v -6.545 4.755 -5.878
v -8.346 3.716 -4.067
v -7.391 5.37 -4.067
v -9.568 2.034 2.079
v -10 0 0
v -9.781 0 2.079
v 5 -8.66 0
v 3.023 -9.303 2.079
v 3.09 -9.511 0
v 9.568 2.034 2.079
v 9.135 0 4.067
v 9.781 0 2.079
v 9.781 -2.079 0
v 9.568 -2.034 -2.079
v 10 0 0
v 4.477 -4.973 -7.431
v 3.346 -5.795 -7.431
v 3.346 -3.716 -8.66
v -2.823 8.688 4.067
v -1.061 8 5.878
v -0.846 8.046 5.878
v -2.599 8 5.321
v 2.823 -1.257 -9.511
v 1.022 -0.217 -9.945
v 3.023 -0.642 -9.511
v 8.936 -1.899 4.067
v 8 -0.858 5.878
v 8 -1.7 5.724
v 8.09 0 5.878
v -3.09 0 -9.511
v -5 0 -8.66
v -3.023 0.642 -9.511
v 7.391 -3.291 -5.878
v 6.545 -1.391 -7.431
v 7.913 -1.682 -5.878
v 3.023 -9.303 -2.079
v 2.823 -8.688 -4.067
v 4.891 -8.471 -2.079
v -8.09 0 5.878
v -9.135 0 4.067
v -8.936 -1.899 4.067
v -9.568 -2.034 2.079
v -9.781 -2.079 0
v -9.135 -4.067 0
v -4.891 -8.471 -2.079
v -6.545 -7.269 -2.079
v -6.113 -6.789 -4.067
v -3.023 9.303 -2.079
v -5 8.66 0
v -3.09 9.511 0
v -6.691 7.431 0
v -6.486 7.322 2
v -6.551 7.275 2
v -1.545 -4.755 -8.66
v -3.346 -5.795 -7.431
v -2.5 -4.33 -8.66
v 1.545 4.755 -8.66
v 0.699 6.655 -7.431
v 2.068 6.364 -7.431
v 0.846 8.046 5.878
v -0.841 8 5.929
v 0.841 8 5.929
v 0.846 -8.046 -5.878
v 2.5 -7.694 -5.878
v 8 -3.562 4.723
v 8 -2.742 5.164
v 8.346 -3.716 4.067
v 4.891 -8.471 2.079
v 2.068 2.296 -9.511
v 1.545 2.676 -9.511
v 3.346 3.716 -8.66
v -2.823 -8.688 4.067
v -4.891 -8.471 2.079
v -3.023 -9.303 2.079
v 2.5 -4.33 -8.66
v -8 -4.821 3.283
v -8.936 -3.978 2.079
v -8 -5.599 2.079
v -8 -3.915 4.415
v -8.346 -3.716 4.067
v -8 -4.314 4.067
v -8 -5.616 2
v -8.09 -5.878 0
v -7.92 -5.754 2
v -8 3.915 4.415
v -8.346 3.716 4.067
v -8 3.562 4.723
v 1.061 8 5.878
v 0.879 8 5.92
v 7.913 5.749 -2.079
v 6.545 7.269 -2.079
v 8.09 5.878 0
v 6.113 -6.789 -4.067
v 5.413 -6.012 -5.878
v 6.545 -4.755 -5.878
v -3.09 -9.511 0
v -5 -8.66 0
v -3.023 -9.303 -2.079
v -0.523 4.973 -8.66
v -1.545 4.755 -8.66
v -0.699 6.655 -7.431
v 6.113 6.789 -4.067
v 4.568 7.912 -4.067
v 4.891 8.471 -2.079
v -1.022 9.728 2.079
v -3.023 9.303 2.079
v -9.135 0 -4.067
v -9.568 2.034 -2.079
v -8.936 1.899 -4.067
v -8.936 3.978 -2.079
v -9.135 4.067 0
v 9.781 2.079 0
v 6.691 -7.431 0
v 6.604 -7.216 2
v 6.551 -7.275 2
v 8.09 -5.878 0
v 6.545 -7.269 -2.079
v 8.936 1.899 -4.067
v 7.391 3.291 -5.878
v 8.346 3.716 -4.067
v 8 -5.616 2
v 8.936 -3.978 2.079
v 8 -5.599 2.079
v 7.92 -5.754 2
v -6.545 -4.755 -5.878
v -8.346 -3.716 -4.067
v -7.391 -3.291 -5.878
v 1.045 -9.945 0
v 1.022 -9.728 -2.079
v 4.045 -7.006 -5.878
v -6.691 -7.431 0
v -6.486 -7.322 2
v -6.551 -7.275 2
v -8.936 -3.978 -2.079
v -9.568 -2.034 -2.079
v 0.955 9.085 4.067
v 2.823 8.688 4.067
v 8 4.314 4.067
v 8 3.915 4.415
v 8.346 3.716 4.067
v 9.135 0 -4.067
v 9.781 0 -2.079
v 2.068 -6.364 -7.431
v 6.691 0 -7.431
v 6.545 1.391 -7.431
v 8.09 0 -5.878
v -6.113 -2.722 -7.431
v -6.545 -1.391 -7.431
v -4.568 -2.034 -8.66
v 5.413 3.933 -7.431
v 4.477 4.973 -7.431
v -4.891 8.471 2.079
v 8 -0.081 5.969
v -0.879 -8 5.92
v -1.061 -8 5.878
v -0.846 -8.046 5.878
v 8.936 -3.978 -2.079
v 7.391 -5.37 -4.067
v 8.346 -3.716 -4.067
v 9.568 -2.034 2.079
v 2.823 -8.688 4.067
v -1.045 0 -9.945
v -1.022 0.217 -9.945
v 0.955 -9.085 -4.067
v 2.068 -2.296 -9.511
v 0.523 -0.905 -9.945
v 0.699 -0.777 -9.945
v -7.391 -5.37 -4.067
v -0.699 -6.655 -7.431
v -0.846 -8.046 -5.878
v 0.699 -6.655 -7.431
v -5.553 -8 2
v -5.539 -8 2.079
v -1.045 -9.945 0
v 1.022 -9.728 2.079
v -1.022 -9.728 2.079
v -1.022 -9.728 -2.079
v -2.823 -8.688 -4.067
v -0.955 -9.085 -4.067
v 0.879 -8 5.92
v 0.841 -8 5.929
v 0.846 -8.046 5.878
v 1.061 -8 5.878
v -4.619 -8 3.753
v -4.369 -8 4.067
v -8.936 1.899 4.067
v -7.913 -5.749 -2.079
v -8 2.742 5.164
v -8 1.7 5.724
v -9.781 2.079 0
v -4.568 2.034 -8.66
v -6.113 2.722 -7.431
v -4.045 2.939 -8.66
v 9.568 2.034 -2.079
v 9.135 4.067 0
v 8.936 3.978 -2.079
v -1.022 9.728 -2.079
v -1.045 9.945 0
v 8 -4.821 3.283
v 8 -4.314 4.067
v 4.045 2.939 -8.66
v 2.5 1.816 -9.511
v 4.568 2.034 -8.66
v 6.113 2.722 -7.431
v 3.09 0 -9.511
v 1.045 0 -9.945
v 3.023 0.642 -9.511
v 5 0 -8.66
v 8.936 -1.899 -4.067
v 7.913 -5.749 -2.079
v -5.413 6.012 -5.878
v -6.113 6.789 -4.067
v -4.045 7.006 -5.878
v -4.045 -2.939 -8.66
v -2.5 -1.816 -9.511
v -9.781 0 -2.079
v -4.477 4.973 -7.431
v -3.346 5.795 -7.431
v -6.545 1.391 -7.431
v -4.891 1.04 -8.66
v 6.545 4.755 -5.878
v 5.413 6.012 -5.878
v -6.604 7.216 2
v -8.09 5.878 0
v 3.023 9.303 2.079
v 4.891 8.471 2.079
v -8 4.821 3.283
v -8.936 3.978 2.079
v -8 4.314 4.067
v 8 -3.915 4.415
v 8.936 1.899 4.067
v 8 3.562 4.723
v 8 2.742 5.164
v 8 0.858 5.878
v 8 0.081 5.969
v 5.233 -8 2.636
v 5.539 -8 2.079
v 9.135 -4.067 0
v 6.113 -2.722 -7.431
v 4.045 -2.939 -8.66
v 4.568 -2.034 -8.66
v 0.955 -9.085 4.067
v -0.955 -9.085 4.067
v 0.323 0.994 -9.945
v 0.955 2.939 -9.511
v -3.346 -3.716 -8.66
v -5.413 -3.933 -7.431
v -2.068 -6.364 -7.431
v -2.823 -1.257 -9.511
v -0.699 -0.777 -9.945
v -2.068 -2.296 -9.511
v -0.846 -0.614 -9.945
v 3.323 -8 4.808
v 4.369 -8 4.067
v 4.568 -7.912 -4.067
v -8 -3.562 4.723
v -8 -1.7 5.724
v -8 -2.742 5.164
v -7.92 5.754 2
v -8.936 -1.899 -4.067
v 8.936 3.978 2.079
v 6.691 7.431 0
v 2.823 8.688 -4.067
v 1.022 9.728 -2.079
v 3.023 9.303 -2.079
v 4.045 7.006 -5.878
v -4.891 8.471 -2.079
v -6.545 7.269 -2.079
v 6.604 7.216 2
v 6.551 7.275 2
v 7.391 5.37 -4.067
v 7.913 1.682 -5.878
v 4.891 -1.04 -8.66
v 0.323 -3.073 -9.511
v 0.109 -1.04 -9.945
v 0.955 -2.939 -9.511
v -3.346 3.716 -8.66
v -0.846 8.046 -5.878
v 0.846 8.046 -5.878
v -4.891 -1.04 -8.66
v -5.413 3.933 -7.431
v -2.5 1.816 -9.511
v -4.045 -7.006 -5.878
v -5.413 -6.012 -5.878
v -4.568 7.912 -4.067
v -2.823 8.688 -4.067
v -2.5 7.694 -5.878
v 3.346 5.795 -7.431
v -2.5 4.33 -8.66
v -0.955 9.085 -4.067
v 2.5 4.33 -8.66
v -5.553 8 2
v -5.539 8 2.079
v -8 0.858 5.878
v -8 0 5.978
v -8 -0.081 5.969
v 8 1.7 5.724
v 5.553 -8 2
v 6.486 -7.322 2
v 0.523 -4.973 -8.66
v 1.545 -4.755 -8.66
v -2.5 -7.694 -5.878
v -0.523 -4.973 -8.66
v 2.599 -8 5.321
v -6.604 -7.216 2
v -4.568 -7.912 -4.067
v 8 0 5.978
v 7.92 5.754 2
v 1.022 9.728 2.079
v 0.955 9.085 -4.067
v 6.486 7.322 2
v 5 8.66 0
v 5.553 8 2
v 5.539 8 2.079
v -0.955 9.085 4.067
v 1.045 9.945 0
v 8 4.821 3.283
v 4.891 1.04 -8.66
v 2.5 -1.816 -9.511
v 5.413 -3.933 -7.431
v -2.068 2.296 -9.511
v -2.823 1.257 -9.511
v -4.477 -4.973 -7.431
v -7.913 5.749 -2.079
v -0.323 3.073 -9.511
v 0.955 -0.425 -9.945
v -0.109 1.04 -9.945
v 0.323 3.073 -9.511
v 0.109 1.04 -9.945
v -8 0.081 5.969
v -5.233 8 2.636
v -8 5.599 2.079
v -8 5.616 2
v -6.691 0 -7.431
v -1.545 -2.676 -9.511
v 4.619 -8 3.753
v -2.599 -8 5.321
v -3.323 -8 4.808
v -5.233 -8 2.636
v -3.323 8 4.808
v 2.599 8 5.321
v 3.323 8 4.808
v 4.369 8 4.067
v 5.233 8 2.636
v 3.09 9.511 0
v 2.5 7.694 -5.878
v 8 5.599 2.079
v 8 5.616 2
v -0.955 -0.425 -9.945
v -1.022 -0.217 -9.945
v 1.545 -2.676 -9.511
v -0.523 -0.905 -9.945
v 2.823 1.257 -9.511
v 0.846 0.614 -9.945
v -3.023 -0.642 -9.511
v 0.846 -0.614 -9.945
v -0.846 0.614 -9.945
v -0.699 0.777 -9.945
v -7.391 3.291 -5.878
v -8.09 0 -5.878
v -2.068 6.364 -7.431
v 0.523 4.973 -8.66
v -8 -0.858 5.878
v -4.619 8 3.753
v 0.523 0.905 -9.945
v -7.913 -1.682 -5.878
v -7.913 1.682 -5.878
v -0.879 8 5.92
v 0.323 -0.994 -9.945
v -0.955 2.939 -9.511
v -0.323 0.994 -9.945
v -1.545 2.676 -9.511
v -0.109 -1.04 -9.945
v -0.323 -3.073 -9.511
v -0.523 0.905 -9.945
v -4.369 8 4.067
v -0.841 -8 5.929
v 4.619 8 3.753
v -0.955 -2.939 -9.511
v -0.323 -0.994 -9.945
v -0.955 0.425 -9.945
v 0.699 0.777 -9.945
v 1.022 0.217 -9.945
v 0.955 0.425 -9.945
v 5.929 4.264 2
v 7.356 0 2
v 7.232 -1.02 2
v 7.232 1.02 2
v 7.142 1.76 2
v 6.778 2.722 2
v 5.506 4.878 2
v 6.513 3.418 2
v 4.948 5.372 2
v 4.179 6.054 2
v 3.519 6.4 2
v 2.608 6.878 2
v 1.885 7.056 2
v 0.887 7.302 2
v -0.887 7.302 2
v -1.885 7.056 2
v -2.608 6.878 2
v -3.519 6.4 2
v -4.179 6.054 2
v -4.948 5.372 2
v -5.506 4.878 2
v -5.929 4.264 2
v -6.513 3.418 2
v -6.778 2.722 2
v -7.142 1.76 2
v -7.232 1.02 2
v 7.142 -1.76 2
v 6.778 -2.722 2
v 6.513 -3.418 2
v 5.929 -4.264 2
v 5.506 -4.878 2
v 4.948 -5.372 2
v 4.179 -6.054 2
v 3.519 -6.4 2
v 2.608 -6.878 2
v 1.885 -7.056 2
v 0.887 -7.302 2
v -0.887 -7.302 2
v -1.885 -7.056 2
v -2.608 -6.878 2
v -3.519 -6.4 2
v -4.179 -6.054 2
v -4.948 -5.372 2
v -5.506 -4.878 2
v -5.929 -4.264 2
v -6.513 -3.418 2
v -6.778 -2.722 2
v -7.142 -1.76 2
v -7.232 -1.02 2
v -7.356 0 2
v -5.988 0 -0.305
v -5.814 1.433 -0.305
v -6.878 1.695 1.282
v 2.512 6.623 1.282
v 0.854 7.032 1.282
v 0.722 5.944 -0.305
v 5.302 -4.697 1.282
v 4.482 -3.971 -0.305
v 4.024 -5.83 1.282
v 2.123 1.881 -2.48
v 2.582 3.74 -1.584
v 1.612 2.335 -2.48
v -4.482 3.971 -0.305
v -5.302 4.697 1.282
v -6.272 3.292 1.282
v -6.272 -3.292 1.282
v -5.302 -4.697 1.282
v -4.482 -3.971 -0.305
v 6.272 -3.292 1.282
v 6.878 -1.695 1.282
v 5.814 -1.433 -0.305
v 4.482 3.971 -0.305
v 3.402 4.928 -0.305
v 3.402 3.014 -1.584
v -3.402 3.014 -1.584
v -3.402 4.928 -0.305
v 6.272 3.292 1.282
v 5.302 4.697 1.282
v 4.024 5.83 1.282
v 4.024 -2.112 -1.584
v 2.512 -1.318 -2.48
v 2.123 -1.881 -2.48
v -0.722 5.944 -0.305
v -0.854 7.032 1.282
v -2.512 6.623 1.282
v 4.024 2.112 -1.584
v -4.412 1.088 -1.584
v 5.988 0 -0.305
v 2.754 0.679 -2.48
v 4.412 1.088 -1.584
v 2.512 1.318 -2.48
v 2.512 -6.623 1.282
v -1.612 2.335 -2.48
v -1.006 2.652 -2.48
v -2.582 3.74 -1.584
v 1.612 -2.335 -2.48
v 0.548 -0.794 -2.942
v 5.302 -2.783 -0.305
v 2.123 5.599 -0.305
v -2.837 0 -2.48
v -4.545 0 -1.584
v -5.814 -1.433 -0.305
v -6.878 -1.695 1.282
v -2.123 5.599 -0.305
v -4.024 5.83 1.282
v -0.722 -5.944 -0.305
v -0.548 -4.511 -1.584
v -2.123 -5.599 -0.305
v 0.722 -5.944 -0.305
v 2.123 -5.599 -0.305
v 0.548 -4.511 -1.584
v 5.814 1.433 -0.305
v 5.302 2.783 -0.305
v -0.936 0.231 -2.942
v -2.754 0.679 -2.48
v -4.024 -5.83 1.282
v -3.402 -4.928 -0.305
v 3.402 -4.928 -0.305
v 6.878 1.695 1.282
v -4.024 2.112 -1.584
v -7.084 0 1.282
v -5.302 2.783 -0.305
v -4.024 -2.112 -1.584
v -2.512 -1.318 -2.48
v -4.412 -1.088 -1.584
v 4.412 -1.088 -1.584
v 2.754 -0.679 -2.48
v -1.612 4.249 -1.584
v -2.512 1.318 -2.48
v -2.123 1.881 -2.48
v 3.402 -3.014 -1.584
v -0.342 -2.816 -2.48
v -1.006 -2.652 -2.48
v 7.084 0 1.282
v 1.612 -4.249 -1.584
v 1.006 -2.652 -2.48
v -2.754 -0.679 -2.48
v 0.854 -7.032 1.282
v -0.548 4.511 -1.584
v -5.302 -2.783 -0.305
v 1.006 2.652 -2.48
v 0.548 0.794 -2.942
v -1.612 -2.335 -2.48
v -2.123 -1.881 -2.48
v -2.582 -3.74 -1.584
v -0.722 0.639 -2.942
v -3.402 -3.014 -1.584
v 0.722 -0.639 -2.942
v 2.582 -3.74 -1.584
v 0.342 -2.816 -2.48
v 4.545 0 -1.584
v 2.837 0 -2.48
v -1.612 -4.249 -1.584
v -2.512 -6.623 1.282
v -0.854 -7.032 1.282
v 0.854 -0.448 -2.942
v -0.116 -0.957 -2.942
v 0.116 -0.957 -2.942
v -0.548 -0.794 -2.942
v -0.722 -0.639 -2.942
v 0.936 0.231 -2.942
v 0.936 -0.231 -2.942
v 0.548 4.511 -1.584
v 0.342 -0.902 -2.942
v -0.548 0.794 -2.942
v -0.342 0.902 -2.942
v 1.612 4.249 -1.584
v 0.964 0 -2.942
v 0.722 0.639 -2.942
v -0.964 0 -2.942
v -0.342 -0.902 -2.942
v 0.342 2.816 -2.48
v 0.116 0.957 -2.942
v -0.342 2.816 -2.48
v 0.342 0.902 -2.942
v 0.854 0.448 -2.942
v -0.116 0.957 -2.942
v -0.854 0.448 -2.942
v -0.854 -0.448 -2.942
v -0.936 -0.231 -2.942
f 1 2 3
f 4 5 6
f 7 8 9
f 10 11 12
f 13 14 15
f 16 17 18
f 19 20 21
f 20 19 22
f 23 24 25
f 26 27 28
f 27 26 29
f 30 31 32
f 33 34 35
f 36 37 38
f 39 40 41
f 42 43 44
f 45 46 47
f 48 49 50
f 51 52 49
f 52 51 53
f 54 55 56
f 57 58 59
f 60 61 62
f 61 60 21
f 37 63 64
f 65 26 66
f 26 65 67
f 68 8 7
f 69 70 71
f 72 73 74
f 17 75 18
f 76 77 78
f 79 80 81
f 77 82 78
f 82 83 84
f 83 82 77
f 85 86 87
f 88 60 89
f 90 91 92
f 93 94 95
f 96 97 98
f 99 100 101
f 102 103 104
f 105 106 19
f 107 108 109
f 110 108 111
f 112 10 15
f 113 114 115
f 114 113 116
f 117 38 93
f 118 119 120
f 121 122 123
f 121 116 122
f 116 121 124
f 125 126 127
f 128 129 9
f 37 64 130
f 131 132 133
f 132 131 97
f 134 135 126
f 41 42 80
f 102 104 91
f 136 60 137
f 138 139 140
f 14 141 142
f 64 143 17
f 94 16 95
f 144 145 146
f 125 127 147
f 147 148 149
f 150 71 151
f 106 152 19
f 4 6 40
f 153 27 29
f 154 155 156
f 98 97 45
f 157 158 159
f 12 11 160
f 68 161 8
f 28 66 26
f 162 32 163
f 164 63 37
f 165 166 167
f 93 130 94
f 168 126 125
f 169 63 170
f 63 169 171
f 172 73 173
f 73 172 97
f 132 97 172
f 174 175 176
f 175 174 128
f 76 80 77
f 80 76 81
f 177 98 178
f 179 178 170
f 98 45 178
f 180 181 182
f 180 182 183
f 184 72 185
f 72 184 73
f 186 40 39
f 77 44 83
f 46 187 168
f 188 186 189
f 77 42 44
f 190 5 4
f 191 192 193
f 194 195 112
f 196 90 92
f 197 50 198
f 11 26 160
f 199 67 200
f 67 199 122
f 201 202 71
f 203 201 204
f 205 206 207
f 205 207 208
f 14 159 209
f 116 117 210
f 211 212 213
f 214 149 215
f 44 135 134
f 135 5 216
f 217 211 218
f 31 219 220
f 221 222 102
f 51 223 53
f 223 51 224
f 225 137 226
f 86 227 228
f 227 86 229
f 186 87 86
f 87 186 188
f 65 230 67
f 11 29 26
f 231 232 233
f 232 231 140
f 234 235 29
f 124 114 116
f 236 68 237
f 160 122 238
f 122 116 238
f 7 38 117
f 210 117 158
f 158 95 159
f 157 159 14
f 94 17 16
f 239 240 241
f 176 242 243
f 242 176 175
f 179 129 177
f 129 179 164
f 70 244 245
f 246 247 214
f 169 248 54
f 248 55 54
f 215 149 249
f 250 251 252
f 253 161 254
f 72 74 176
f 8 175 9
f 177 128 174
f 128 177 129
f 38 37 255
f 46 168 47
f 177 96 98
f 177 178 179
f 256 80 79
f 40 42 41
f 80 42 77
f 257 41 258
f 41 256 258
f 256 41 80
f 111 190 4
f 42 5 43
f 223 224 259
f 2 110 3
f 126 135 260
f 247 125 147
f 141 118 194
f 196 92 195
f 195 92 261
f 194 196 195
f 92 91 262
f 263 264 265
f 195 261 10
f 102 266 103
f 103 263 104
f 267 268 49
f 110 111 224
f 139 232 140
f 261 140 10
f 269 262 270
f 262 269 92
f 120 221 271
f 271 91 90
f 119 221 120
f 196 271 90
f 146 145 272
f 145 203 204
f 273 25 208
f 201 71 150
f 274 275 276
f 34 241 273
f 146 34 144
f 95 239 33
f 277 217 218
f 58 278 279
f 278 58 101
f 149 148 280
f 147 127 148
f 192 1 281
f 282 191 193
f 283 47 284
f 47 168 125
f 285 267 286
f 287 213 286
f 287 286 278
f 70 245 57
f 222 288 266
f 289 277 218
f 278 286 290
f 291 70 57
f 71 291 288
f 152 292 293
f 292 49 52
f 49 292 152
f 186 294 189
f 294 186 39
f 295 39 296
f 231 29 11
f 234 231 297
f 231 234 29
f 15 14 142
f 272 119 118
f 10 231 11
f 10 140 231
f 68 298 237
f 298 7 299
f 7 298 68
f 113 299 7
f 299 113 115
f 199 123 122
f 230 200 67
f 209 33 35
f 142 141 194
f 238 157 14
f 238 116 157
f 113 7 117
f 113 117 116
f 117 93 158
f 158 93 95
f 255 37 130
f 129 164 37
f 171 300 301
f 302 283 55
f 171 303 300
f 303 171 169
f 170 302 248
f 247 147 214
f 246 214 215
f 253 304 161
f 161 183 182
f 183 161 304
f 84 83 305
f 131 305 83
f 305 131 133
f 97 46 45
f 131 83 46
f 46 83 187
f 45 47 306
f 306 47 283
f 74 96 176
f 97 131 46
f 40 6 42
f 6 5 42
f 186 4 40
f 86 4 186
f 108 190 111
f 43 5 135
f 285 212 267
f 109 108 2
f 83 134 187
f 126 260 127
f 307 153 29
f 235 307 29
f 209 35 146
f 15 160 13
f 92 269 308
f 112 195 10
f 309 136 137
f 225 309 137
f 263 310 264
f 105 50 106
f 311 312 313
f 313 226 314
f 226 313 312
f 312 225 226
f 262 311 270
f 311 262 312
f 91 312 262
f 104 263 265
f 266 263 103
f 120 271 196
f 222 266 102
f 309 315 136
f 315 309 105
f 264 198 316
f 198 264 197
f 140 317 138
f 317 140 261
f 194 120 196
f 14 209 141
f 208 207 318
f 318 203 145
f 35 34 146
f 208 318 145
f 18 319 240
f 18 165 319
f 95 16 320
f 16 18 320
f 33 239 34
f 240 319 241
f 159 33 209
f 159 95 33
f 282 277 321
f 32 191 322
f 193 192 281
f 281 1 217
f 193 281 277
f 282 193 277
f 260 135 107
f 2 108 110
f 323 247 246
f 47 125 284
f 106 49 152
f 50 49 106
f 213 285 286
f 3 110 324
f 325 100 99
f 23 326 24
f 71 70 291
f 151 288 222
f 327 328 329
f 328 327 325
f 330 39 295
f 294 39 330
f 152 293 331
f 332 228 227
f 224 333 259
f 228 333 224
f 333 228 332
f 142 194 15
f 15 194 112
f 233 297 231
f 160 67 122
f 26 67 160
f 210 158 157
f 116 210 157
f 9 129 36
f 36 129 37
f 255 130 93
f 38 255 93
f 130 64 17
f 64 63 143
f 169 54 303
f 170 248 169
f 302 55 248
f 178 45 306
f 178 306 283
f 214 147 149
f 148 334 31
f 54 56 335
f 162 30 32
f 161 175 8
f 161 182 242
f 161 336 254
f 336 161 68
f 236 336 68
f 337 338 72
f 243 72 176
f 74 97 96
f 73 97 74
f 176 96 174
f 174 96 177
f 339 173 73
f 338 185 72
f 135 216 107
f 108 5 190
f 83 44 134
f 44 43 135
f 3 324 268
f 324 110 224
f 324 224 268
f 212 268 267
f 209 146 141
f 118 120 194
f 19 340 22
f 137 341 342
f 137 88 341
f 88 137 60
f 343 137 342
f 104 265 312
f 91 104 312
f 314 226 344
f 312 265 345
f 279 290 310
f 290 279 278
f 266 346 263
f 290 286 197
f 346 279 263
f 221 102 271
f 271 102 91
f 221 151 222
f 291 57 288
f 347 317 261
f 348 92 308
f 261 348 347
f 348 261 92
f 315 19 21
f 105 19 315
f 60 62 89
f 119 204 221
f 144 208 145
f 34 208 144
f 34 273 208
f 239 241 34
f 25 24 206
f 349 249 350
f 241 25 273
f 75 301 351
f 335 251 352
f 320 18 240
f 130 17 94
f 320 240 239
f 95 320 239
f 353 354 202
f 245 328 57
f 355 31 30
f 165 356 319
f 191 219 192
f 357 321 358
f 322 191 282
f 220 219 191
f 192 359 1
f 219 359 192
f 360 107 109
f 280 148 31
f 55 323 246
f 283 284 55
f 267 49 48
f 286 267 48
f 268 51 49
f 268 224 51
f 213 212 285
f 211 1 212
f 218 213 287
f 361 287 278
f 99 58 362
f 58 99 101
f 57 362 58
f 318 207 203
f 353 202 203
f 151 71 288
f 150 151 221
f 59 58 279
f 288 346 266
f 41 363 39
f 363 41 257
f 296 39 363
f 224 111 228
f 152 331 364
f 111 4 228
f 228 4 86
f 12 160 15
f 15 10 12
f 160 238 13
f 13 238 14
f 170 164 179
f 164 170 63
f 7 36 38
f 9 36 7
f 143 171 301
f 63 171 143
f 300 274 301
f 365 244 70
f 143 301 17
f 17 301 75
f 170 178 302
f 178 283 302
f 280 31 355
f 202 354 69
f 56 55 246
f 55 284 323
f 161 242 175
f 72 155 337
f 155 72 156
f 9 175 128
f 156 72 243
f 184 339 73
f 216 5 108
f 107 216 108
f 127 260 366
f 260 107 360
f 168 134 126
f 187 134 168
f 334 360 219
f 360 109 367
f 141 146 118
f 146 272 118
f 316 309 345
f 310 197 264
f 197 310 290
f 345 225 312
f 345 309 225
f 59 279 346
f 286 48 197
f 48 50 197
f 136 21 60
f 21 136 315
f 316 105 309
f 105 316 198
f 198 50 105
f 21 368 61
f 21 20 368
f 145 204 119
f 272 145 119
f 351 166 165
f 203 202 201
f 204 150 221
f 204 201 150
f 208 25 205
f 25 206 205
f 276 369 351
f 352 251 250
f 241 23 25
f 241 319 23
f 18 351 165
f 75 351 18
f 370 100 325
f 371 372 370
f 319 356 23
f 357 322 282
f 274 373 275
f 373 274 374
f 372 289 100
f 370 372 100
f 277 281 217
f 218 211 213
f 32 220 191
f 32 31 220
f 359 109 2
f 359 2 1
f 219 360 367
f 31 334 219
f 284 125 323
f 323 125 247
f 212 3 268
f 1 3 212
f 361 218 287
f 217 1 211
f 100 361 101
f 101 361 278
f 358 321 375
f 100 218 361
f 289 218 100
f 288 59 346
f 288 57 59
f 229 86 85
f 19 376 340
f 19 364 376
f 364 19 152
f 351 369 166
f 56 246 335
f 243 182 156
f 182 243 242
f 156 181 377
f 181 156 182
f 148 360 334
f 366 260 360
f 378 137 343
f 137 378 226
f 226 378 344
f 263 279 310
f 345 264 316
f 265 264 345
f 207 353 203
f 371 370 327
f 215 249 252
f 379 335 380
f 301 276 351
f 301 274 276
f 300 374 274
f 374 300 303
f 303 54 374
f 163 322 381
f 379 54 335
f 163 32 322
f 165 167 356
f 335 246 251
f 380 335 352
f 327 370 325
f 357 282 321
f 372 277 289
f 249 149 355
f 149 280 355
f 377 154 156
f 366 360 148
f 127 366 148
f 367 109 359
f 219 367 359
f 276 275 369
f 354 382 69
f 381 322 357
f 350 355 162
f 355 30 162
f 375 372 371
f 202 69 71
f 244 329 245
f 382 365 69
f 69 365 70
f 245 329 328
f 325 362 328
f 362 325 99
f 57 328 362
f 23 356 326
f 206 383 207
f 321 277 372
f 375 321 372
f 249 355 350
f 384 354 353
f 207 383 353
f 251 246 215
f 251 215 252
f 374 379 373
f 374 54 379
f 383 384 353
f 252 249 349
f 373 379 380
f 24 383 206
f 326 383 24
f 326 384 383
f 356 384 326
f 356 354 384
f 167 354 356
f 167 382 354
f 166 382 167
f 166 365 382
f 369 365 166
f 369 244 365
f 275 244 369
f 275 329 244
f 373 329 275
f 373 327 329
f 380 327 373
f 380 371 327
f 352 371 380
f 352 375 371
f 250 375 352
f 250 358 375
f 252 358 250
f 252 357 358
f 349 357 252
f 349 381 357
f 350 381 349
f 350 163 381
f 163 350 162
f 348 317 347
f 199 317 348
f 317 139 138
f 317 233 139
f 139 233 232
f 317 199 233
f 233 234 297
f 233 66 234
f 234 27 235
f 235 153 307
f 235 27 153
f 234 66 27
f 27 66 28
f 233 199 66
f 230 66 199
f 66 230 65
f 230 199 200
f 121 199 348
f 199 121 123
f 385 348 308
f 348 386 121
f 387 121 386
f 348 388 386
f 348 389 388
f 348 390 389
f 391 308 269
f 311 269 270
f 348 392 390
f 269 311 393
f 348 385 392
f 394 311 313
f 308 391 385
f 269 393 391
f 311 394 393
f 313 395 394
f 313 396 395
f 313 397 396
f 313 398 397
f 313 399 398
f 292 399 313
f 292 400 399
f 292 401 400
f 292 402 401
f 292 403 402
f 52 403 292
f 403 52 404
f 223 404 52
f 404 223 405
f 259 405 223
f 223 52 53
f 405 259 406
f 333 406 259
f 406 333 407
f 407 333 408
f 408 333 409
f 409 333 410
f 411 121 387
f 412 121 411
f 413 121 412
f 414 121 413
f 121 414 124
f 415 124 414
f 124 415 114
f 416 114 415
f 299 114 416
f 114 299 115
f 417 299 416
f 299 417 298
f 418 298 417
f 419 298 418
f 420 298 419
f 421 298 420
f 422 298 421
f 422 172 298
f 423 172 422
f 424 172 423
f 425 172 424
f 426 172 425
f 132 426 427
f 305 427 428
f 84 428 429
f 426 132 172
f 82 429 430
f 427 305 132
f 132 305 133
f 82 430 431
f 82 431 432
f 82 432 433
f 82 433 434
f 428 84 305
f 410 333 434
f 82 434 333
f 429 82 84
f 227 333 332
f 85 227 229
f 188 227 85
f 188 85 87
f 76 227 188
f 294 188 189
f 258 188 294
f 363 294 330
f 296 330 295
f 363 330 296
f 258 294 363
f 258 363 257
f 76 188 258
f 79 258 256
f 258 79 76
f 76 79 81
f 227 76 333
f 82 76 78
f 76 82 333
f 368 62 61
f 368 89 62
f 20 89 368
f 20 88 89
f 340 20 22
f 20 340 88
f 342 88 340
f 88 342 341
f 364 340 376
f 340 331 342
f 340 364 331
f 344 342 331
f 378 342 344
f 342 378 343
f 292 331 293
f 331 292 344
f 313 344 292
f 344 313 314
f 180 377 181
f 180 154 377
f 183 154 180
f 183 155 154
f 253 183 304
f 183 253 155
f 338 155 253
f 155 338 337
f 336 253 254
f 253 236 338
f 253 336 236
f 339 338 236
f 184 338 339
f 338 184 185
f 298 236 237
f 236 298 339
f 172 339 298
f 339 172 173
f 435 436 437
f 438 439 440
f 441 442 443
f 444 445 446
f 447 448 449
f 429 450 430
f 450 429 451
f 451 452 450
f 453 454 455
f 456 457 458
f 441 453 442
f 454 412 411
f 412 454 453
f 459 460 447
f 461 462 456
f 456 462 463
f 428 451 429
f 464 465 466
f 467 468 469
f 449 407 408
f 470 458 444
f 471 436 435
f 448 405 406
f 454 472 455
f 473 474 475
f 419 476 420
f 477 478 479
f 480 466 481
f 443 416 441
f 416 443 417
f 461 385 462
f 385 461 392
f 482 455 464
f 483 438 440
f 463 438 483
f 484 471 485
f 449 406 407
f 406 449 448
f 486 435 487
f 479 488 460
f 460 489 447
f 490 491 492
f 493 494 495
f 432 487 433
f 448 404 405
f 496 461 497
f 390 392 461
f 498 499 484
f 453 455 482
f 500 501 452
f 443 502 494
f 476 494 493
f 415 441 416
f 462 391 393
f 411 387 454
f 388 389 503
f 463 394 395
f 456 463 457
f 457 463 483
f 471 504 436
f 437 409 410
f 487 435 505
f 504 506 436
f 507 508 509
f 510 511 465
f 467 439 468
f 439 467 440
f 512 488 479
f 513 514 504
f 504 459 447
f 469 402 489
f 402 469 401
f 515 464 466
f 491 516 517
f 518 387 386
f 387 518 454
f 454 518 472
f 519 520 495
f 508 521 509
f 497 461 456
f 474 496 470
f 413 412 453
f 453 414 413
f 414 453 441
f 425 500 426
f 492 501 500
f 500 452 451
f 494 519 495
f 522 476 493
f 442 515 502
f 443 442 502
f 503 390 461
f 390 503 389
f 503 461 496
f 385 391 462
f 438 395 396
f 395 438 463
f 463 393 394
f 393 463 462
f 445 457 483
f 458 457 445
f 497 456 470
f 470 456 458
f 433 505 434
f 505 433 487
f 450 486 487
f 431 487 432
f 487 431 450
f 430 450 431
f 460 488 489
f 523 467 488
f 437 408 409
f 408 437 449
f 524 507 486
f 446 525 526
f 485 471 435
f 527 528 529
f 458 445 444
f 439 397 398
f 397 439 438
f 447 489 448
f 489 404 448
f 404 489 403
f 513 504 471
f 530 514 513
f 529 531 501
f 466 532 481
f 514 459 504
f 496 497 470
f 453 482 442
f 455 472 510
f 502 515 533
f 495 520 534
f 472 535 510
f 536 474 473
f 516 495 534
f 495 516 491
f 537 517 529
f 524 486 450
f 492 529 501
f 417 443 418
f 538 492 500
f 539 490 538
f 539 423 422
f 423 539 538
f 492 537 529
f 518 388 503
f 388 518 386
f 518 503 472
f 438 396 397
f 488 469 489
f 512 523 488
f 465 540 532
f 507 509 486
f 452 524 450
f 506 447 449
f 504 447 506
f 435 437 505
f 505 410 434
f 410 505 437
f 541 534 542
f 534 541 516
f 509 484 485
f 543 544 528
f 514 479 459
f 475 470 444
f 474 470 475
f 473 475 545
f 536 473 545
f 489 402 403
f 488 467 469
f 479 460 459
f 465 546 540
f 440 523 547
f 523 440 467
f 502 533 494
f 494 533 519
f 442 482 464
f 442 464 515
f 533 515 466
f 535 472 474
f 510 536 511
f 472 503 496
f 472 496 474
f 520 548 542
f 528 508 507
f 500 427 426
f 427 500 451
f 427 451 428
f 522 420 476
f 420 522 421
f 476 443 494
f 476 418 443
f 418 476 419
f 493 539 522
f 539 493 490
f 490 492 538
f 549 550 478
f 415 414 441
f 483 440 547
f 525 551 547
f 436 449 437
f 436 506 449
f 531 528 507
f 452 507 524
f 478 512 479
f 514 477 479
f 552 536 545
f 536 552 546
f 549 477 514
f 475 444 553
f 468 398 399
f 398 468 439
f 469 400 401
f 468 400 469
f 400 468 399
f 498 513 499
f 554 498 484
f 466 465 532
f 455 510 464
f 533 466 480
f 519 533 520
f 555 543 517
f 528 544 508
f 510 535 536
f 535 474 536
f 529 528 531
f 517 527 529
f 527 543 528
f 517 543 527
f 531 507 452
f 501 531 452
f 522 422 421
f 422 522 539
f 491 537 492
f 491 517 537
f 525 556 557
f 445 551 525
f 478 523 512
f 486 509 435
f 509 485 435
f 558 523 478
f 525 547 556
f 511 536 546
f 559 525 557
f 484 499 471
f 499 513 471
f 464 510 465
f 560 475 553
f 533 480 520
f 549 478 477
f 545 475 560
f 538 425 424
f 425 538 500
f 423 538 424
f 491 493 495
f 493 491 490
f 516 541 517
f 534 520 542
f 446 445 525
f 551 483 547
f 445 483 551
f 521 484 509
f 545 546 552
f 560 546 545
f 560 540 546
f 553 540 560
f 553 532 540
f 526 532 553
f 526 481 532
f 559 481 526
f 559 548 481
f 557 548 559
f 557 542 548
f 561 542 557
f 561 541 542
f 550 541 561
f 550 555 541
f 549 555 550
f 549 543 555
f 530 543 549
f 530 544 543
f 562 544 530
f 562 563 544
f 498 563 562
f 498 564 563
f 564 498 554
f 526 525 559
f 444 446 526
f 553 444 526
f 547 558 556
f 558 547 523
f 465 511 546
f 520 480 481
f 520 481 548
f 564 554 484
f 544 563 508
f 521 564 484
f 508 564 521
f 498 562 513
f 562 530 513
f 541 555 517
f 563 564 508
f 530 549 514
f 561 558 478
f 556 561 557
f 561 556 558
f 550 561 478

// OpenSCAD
// Volume: 2284.7681905214977, SurfaceArea: 1341.1703131100762
difference() {
  sphere(10);
  color("red") translate([0,0,10]) cube(16, center=true);
  translate([0,0,5]) sphere(8);
}
